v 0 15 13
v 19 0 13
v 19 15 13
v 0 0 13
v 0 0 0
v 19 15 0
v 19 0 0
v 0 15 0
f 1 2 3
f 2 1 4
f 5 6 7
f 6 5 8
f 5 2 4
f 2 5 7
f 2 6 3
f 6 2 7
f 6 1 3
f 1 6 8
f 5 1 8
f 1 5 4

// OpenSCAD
// Generated by SolidPython 1.0.1 on 2020-07-29 00:46:56


cube(size = [19, 15, 13]);
/***********************************************
*********      SolidPython code:      **********
************************************************
 
# import packages: SolidPython
from solid import *
from solid.utils import *
from itertools import chain, combinations, permutations


class Resize:

    def __init__(self, scad_file):
        self.scad_file = scad_file
        #self.scad_file = import_scad(scad_file)
        # cone/cylinder param:
        self.r1 = 0
        self.r2 = 0
        self.h = 0
        # rectangular prism param:
        self.w = 0
        self.l = 0
        # ellipse param:
        self.r = 0

    # import OpenScad code (file name corresponds to shape)


    # classify shape + parameters
    def assign(self, param1, param2, param3):
        if self.scad_file == 'cone.scad':
            self.r1 = param1
            self.r2 = param2
            self.h = param3
        elif self.scad_file == 'cylinder.scad':
            self.r1 = param1
            self.r2 = param2
            self.h = param3
        elif self.scad_file == 'rectangularPrism.scad':
            self.h = param1
            self.l = param2
            self.w = param3
        else:
            self.r = param1
            self.h = param2

    # resize parameters
    def iterate(self):
        x = range(3, 20, 2)
        i = 1
        if self.scad_file == 'cone.scad':
            tempList = list(permutations(x, 2))
            for temp in tempList:
                param1 = temp[0]
                param2 = temp[1]
                filepath = 'produced_scad_files/' + 'cone' + str(param1) + '_' + str(param2) + '_' + '.scad'
                scad_render_to_file(cylinder(h=param1, r1=param2, r2=0), filepath)

        elif self.scad_file == 'cylinder.scad':
            tempList = list(permutations(x, 3))
            for temp in tempList:
                param1 = temp[0]
                param2 = temp[1]
                filepath = 'produced_scad_files/' + 'cylinder' + str(param1) + '_' + str(param2) + '_' + '.scad'
                scad_render_to_file(cylinder(h=param1, r1=param2, r2=param2), filepath)

        elif self.scad_file == 'rectangularPrism.scad':
            tempList = list(permutations(x, 3))
            for temp in tempList:
                param1 = temp[0]
                param2 = temp[1]
                param3 = temp[2]
                filepath = 'produced_scad_files/' + 'rectangularPrism' + str(param1) + '_' + str(param2) + '_' + str(
                    param3) + '.scad'
                scad_render_to_file(cube(size=(param1, param2, param3)), filepath)

        elif self.scad_file == 'ellipse.scad':
            tempList = list(permutations(x, 4))
            for temp in tempList:
                param1 = temp[0]
                param2 = temp[1]
                param3 = temp[2]
                param4 = temp[3]
                filepath = 'produced_scad_files/' + 'ellipse' + str(param1) + '_' + str(param2) + '_' + str(param3) + '_' + str(param4) + '.scad'
                scad_render_to_file(scale([param1, param2, param3])(sphere(r=param4)), filepath)

    def render_to_scadfile(self):
        scad_render_to_file(scad, 'example.scad') 
 
************************************************/
